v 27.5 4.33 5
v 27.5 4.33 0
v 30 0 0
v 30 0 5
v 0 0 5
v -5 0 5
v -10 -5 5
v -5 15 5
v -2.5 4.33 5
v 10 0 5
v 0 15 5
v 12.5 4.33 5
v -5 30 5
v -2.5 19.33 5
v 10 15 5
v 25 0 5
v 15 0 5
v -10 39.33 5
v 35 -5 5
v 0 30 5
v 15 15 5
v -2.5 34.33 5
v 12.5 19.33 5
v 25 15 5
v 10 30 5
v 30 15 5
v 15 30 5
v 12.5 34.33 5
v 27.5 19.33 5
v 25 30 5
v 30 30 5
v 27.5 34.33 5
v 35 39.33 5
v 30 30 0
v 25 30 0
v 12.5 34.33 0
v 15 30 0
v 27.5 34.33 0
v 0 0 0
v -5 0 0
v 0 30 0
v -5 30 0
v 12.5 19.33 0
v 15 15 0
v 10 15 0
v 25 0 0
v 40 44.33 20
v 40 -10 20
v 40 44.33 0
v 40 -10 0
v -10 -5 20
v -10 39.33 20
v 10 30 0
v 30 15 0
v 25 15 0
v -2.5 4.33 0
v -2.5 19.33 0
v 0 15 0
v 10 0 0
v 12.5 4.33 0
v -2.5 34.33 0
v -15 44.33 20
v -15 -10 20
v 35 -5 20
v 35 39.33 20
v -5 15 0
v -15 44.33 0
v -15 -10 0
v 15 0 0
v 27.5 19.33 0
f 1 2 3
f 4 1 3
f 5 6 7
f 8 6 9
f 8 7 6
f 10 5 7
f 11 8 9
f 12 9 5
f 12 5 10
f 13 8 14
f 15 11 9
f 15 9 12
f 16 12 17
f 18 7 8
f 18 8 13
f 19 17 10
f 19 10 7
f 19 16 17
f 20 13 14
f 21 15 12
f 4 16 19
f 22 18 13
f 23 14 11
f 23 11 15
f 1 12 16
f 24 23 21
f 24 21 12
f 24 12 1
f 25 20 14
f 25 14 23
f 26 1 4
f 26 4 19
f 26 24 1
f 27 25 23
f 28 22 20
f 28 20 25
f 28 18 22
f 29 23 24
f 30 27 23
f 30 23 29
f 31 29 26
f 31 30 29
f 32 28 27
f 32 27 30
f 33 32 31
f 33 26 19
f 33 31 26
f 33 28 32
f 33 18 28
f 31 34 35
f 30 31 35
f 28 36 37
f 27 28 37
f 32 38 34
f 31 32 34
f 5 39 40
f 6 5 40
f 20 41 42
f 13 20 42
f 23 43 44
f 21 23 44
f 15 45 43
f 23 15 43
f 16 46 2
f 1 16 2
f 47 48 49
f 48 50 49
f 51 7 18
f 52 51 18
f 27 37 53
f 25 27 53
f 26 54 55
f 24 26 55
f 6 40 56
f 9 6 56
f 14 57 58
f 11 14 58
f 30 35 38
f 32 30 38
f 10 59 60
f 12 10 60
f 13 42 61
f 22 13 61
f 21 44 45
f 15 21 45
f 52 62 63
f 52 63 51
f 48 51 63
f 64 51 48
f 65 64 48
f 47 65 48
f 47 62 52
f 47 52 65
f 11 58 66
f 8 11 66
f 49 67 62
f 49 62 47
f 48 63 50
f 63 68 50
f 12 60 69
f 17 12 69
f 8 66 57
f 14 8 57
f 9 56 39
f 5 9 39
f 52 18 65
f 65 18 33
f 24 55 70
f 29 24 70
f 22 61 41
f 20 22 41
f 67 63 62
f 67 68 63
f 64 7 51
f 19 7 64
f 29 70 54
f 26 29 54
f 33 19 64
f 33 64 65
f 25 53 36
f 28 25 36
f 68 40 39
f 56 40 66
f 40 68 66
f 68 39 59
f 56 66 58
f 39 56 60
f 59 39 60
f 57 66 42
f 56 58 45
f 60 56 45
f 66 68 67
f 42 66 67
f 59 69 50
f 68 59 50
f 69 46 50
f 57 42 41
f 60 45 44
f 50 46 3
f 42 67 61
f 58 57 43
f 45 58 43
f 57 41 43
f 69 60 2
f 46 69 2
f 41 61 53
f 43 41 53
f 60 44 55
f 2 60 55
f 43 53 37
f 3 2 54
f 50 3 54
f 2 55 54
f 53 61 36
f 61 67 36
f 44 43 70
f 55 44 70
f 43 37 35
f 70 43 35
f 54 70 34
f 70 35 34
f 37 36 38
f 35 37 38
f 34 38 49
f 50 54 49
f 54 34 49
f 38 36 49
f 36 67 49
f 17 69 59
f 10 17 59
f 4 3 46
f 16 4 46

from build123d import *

# Parameters (mm, degrees)
F0_W     = 55
F0_H     = 54.330127
F1_DEPTH = 5
F2_W     = 55
F2_H     = 54.330127
F2_W_2   = 45
F2_H_2   = 44.330127
F3_DEPTH = 15


with BuildPart() as f1:
    # F0 (on Top) → F1 (new body)
    with BuildSketch(Plane.XY):
        with Locations((12.5, 17.165063)):
            Rectangle(F0_W, F0_H)
        Polygon((-5, 0), (-2.5, 4.330127), (0, 0), align=None, mode=Mode.SUBTRACT)
        Polygon((15, 0), (10, 0), (12.5, 4.330127), align=None, mode=Mode.SUBTRACT)
        Polygon((30, 0), (25, 0), (27.5, 4.330127), align=None, mode=Mode.SUBTRACT)
        Polygon((0, 15), (-5, 15), (-2.5, 19.330127), align=None, mode=Mode.SUBTRACT)
        Polygon((0, 30), (-5, 30), (-2.5, 34.330127), align=None, mode=Mode.SUBTRACT)
        Polygon((15, 15), (10, 15), (12.5, 19.330127), align=None, mode=Mode.SUBTRACT)
        Polygon((30, 15), (25, 15), (27.5, 19.330127), align=None, mode=Mode.SUBTRACT)
        Polygon((15, 30), (10, 30), (12.5, 34.330127), align=None, mode=Mode.SUBTRACT)
        Polygon((30, 30), (25, 30), (27.5, 34.330127), align=None, mode=Mode.SUBTRACT)
    extrude(amount=F1_DEPTH)

    # F2 (on face) → F3 (join)
    with BuildSketch(Plane.XY.offset(5)):
        with Locations((12.5, 17.165063)):
            Rectangle(F2_W, F2_H)
        with Locations((12.5, 17.165063)):
            Rectangle(F2_W_2, F2_H_2, mode=Mode.SUBTRACT)
    extrude(amount=F3_DEPTH)


solid = f1.part
